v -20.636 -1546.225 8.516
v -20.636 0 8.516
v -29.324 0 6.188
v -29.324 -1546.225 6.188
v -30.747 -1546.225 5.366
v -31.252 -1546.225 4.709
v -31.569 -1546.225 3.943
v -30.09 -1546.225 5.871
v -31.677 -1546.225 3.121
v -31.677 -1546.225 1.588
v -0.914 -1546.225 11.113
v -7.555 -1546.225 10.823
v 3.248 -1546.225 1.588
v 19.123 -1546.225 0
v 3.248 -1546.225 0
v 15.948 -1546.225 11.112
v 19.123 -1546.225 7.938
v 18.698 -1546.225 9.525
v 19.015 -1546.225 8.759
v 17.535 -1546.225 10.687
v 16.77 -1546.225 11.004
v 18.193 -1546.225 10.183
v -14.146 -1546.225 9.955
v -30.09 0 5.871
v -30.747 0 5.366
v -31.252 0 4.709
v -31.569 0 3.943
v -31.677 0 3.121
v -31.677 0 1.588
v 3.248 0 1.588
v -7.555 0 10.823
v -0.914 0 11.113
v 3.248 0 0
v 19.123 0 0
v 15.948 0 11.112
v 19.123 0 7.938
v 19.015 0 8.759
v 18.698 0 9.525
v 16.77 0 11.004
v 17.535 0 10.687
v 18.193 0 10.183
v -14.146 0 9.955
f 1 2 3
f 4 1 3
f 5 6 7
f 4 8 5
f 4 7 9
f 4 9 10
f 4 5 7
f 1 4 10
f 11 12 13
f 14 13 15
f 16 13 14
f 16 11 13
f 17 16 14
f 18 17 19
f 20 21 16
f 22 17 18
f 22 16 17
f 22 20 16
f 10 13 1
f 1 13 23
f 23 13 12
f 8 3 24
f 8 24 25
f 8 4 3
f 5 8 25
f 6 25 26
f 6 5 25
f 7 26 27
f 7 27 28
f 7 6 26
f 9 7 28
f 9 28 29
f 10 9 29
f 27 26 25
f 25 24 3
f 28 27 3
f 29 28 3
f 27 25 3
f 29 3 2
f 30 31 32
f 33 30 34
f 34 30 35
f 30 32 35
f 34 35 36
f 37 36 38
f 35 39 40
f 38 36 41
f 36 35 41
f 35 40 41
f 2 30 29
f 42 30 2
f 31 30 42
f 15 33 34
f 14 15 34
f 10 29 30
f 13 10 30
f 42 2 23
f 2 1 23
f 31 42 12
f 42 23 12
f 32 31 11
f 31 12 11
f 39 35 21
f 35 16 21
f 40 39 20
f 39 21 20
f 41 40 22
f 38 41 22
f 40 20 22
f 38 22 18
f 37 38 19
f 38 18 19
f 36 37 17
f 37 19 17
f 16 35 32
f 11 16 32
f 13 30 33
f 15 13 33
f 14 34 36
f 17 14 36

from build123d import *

# Parameters (mm, degrees)
F1_DEPTH = 1546.225
F2_R     = 76.2
F3_R     = 3.175
F4_R     = 3.175


with BuildPart() as f1:
    # F0 (on Front) → F1 (new body)
    with BuildSketch(Plane.XZ):
        Polygon((-10.945544, 11.1125), (-31.677012, 5.55752), (-31.677012, 1.5875), (3.247988, 1.5875), (3.247988, 0), (19.122988, 0), (19.122988, 11.1125), align=None)
    extrude(amount=F1_DEPTH)

    # F2
    f2_edges = [f1.edges().sort_by_distance(p)[0] for p in [
        (-10.945544, -773.1125, 11.1125),
    ]]
    fillet(f2_edges, radius=F2_R)

    # F3
    f3_edges = [f1.edges().sort_by_distance(p)[0] for p in [
        (-31.677012, -773.1125, 5.55752),
    ]]
    fillet(f3_edges, radius=F3_R)

    # F4
    f4_edges = [f1.edges().sort_by_distance(p)[0] for p in [
        (19.122988, -773.1125, 11.1125),
    ]]
    fillet(f4_edges, radius=F4_R)


solid = f1.part
